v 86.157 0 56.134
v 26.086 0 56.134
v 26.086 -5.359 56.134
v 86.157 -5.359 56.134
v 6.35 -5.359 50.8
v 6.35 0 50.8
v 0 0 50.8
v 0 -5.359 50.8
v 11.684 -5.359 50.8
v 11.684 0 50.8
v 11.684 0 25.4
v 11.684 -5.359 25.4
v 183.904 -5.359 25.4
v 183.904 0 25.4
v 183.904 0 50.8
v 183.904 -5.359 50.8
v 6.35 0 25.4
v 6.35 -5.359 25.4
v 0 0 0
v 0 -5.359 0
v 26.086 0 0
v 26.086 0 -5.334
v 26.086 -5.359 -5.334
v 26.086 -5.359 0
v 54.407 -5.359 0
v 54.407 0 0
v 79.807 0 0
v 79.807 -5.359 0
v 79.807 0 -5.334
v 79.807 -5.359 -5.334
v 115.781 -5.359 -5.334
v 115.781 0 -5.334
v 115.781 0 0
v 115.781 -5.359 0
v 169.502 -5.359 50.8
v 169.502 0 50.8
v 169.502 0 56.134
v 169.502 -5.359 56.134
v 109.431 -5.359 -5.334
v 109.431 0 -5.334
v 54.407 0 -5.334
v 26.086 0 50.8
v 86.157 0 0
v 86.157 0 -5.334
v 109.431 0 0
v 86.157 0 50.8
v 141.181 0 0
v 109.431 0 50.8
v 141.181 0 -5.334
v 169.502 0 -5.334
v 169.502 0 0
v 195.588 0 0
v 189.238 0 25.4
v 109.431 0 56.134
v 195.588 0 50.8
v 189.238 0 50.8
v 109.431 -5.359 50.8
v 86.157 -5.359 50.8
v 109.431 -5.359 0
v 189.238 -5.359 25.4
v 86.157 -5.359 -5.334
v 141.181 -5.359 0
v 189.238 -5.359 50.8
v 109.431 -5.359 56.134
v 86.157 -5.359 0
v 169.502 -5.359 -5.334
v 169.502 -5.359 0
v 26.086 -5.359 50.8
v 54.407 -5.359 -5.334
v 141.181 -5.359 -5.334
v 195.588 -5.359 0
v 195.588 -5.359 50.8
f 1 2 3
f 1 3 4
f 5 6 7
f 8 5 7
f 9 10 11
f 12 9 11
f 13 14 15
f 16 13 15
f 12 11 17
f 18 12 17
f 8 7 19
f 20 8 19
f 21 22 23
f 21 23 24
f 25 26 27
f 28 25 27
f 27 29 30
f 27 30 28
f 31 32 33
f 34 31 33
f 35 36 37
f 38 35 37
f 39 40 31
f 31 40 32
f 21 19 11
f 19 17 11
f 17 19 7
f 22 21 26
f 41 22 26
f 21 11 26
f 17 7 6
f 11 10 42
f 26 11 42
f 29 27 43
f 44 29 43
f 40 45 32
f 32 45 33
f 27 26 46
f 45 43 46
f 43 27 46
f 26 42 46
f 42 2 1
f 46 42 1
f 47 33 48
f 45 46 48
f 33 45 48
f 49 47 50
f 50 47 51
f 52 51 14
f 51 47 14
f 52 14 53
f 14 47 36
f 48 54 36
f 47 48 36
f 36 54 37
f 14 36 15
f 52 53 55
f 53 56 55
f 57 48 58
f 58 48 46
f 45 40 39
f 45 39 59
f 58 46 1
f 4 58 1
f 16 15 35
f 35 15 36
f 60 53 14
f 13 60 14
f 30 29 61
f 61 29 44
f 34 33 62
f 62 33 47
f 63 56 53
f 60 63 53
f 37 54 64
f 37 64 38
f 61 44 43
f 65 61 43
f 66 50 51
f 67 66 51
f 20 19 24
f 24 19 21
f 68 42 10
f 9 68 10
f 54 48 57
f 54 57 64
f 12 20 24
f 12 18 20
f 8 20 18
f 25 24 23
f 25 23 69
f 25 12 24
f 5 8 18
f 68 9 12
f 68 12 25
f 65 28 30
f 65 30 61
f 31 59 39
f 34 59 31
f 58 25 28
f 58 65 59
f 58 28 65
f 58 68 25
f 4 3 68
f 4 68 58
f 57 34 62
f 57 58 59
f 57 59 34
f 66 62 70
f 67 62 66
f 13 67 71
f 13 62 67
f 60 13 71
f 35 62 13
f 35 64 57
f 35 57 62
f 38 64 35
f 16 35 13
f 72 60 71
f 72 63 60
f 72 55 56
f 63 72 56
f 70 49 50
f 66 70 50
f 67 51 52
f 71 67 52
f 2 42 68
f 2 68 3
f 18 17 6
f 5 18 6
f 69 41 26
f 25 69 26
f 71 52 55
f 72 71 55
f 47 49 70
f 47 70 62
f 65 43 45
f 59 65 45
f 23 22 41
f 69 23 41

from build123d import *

# Parameters (mm, degrees)
F0_W     = 60.071
F0_H     = 5.334
F0_W_2   = 28.321
F0_W_3   = 6.35
F1_DEPTH = 5.3594


with BuildPart() as f1:
    # F0 (on Front) → F1 (new body)
    with BuildSketch(Plane.XZ):
        with Locations((56.1213, 53.467)):
            Rectangle(F0_W, F0_H)
        with Locations((139.466246, 53.467)):
            Rectangle(F0_W, F0_H)
        Polygon((0, 50.8), (0, 0), (26.0858, 0), (54.4068, 0), (79.8068, 0), (86.1568, 0), (109.430746, 0), (115.780746, 0), (141.180746, 0), (169.501746, 0), (195.587546, 0), (195.587546, 50.8), (189.237546, 50.8), (189.237546, 25.4), (183.903546, 25.4), (183.903546, 50.8), (169.501746, 50.8), (109.430746, 50.8), (86.1568, 50.8), (26.0858, 50.8), (11.684, 50.8), (11.684, 25.4), (6.35, 25.4), (6.35, 50.8), align=None)
        with Locations((40.2463, -2.667)):
            Rectangle(F0_W_2, F0_H)
        with Locations((82.9818, -2.667)):
            Rectangle(F0_W_3, F0_H)
        with Locations((112.605746, -2.667)):
            Rectangle(F0_W_3, F0_H)
        with Locations((155.341246, -2.667)):
            Rectangle(F0_W_2, F0_H)
    extrude(amount=F1_DEPTH)


solid = f1.part
